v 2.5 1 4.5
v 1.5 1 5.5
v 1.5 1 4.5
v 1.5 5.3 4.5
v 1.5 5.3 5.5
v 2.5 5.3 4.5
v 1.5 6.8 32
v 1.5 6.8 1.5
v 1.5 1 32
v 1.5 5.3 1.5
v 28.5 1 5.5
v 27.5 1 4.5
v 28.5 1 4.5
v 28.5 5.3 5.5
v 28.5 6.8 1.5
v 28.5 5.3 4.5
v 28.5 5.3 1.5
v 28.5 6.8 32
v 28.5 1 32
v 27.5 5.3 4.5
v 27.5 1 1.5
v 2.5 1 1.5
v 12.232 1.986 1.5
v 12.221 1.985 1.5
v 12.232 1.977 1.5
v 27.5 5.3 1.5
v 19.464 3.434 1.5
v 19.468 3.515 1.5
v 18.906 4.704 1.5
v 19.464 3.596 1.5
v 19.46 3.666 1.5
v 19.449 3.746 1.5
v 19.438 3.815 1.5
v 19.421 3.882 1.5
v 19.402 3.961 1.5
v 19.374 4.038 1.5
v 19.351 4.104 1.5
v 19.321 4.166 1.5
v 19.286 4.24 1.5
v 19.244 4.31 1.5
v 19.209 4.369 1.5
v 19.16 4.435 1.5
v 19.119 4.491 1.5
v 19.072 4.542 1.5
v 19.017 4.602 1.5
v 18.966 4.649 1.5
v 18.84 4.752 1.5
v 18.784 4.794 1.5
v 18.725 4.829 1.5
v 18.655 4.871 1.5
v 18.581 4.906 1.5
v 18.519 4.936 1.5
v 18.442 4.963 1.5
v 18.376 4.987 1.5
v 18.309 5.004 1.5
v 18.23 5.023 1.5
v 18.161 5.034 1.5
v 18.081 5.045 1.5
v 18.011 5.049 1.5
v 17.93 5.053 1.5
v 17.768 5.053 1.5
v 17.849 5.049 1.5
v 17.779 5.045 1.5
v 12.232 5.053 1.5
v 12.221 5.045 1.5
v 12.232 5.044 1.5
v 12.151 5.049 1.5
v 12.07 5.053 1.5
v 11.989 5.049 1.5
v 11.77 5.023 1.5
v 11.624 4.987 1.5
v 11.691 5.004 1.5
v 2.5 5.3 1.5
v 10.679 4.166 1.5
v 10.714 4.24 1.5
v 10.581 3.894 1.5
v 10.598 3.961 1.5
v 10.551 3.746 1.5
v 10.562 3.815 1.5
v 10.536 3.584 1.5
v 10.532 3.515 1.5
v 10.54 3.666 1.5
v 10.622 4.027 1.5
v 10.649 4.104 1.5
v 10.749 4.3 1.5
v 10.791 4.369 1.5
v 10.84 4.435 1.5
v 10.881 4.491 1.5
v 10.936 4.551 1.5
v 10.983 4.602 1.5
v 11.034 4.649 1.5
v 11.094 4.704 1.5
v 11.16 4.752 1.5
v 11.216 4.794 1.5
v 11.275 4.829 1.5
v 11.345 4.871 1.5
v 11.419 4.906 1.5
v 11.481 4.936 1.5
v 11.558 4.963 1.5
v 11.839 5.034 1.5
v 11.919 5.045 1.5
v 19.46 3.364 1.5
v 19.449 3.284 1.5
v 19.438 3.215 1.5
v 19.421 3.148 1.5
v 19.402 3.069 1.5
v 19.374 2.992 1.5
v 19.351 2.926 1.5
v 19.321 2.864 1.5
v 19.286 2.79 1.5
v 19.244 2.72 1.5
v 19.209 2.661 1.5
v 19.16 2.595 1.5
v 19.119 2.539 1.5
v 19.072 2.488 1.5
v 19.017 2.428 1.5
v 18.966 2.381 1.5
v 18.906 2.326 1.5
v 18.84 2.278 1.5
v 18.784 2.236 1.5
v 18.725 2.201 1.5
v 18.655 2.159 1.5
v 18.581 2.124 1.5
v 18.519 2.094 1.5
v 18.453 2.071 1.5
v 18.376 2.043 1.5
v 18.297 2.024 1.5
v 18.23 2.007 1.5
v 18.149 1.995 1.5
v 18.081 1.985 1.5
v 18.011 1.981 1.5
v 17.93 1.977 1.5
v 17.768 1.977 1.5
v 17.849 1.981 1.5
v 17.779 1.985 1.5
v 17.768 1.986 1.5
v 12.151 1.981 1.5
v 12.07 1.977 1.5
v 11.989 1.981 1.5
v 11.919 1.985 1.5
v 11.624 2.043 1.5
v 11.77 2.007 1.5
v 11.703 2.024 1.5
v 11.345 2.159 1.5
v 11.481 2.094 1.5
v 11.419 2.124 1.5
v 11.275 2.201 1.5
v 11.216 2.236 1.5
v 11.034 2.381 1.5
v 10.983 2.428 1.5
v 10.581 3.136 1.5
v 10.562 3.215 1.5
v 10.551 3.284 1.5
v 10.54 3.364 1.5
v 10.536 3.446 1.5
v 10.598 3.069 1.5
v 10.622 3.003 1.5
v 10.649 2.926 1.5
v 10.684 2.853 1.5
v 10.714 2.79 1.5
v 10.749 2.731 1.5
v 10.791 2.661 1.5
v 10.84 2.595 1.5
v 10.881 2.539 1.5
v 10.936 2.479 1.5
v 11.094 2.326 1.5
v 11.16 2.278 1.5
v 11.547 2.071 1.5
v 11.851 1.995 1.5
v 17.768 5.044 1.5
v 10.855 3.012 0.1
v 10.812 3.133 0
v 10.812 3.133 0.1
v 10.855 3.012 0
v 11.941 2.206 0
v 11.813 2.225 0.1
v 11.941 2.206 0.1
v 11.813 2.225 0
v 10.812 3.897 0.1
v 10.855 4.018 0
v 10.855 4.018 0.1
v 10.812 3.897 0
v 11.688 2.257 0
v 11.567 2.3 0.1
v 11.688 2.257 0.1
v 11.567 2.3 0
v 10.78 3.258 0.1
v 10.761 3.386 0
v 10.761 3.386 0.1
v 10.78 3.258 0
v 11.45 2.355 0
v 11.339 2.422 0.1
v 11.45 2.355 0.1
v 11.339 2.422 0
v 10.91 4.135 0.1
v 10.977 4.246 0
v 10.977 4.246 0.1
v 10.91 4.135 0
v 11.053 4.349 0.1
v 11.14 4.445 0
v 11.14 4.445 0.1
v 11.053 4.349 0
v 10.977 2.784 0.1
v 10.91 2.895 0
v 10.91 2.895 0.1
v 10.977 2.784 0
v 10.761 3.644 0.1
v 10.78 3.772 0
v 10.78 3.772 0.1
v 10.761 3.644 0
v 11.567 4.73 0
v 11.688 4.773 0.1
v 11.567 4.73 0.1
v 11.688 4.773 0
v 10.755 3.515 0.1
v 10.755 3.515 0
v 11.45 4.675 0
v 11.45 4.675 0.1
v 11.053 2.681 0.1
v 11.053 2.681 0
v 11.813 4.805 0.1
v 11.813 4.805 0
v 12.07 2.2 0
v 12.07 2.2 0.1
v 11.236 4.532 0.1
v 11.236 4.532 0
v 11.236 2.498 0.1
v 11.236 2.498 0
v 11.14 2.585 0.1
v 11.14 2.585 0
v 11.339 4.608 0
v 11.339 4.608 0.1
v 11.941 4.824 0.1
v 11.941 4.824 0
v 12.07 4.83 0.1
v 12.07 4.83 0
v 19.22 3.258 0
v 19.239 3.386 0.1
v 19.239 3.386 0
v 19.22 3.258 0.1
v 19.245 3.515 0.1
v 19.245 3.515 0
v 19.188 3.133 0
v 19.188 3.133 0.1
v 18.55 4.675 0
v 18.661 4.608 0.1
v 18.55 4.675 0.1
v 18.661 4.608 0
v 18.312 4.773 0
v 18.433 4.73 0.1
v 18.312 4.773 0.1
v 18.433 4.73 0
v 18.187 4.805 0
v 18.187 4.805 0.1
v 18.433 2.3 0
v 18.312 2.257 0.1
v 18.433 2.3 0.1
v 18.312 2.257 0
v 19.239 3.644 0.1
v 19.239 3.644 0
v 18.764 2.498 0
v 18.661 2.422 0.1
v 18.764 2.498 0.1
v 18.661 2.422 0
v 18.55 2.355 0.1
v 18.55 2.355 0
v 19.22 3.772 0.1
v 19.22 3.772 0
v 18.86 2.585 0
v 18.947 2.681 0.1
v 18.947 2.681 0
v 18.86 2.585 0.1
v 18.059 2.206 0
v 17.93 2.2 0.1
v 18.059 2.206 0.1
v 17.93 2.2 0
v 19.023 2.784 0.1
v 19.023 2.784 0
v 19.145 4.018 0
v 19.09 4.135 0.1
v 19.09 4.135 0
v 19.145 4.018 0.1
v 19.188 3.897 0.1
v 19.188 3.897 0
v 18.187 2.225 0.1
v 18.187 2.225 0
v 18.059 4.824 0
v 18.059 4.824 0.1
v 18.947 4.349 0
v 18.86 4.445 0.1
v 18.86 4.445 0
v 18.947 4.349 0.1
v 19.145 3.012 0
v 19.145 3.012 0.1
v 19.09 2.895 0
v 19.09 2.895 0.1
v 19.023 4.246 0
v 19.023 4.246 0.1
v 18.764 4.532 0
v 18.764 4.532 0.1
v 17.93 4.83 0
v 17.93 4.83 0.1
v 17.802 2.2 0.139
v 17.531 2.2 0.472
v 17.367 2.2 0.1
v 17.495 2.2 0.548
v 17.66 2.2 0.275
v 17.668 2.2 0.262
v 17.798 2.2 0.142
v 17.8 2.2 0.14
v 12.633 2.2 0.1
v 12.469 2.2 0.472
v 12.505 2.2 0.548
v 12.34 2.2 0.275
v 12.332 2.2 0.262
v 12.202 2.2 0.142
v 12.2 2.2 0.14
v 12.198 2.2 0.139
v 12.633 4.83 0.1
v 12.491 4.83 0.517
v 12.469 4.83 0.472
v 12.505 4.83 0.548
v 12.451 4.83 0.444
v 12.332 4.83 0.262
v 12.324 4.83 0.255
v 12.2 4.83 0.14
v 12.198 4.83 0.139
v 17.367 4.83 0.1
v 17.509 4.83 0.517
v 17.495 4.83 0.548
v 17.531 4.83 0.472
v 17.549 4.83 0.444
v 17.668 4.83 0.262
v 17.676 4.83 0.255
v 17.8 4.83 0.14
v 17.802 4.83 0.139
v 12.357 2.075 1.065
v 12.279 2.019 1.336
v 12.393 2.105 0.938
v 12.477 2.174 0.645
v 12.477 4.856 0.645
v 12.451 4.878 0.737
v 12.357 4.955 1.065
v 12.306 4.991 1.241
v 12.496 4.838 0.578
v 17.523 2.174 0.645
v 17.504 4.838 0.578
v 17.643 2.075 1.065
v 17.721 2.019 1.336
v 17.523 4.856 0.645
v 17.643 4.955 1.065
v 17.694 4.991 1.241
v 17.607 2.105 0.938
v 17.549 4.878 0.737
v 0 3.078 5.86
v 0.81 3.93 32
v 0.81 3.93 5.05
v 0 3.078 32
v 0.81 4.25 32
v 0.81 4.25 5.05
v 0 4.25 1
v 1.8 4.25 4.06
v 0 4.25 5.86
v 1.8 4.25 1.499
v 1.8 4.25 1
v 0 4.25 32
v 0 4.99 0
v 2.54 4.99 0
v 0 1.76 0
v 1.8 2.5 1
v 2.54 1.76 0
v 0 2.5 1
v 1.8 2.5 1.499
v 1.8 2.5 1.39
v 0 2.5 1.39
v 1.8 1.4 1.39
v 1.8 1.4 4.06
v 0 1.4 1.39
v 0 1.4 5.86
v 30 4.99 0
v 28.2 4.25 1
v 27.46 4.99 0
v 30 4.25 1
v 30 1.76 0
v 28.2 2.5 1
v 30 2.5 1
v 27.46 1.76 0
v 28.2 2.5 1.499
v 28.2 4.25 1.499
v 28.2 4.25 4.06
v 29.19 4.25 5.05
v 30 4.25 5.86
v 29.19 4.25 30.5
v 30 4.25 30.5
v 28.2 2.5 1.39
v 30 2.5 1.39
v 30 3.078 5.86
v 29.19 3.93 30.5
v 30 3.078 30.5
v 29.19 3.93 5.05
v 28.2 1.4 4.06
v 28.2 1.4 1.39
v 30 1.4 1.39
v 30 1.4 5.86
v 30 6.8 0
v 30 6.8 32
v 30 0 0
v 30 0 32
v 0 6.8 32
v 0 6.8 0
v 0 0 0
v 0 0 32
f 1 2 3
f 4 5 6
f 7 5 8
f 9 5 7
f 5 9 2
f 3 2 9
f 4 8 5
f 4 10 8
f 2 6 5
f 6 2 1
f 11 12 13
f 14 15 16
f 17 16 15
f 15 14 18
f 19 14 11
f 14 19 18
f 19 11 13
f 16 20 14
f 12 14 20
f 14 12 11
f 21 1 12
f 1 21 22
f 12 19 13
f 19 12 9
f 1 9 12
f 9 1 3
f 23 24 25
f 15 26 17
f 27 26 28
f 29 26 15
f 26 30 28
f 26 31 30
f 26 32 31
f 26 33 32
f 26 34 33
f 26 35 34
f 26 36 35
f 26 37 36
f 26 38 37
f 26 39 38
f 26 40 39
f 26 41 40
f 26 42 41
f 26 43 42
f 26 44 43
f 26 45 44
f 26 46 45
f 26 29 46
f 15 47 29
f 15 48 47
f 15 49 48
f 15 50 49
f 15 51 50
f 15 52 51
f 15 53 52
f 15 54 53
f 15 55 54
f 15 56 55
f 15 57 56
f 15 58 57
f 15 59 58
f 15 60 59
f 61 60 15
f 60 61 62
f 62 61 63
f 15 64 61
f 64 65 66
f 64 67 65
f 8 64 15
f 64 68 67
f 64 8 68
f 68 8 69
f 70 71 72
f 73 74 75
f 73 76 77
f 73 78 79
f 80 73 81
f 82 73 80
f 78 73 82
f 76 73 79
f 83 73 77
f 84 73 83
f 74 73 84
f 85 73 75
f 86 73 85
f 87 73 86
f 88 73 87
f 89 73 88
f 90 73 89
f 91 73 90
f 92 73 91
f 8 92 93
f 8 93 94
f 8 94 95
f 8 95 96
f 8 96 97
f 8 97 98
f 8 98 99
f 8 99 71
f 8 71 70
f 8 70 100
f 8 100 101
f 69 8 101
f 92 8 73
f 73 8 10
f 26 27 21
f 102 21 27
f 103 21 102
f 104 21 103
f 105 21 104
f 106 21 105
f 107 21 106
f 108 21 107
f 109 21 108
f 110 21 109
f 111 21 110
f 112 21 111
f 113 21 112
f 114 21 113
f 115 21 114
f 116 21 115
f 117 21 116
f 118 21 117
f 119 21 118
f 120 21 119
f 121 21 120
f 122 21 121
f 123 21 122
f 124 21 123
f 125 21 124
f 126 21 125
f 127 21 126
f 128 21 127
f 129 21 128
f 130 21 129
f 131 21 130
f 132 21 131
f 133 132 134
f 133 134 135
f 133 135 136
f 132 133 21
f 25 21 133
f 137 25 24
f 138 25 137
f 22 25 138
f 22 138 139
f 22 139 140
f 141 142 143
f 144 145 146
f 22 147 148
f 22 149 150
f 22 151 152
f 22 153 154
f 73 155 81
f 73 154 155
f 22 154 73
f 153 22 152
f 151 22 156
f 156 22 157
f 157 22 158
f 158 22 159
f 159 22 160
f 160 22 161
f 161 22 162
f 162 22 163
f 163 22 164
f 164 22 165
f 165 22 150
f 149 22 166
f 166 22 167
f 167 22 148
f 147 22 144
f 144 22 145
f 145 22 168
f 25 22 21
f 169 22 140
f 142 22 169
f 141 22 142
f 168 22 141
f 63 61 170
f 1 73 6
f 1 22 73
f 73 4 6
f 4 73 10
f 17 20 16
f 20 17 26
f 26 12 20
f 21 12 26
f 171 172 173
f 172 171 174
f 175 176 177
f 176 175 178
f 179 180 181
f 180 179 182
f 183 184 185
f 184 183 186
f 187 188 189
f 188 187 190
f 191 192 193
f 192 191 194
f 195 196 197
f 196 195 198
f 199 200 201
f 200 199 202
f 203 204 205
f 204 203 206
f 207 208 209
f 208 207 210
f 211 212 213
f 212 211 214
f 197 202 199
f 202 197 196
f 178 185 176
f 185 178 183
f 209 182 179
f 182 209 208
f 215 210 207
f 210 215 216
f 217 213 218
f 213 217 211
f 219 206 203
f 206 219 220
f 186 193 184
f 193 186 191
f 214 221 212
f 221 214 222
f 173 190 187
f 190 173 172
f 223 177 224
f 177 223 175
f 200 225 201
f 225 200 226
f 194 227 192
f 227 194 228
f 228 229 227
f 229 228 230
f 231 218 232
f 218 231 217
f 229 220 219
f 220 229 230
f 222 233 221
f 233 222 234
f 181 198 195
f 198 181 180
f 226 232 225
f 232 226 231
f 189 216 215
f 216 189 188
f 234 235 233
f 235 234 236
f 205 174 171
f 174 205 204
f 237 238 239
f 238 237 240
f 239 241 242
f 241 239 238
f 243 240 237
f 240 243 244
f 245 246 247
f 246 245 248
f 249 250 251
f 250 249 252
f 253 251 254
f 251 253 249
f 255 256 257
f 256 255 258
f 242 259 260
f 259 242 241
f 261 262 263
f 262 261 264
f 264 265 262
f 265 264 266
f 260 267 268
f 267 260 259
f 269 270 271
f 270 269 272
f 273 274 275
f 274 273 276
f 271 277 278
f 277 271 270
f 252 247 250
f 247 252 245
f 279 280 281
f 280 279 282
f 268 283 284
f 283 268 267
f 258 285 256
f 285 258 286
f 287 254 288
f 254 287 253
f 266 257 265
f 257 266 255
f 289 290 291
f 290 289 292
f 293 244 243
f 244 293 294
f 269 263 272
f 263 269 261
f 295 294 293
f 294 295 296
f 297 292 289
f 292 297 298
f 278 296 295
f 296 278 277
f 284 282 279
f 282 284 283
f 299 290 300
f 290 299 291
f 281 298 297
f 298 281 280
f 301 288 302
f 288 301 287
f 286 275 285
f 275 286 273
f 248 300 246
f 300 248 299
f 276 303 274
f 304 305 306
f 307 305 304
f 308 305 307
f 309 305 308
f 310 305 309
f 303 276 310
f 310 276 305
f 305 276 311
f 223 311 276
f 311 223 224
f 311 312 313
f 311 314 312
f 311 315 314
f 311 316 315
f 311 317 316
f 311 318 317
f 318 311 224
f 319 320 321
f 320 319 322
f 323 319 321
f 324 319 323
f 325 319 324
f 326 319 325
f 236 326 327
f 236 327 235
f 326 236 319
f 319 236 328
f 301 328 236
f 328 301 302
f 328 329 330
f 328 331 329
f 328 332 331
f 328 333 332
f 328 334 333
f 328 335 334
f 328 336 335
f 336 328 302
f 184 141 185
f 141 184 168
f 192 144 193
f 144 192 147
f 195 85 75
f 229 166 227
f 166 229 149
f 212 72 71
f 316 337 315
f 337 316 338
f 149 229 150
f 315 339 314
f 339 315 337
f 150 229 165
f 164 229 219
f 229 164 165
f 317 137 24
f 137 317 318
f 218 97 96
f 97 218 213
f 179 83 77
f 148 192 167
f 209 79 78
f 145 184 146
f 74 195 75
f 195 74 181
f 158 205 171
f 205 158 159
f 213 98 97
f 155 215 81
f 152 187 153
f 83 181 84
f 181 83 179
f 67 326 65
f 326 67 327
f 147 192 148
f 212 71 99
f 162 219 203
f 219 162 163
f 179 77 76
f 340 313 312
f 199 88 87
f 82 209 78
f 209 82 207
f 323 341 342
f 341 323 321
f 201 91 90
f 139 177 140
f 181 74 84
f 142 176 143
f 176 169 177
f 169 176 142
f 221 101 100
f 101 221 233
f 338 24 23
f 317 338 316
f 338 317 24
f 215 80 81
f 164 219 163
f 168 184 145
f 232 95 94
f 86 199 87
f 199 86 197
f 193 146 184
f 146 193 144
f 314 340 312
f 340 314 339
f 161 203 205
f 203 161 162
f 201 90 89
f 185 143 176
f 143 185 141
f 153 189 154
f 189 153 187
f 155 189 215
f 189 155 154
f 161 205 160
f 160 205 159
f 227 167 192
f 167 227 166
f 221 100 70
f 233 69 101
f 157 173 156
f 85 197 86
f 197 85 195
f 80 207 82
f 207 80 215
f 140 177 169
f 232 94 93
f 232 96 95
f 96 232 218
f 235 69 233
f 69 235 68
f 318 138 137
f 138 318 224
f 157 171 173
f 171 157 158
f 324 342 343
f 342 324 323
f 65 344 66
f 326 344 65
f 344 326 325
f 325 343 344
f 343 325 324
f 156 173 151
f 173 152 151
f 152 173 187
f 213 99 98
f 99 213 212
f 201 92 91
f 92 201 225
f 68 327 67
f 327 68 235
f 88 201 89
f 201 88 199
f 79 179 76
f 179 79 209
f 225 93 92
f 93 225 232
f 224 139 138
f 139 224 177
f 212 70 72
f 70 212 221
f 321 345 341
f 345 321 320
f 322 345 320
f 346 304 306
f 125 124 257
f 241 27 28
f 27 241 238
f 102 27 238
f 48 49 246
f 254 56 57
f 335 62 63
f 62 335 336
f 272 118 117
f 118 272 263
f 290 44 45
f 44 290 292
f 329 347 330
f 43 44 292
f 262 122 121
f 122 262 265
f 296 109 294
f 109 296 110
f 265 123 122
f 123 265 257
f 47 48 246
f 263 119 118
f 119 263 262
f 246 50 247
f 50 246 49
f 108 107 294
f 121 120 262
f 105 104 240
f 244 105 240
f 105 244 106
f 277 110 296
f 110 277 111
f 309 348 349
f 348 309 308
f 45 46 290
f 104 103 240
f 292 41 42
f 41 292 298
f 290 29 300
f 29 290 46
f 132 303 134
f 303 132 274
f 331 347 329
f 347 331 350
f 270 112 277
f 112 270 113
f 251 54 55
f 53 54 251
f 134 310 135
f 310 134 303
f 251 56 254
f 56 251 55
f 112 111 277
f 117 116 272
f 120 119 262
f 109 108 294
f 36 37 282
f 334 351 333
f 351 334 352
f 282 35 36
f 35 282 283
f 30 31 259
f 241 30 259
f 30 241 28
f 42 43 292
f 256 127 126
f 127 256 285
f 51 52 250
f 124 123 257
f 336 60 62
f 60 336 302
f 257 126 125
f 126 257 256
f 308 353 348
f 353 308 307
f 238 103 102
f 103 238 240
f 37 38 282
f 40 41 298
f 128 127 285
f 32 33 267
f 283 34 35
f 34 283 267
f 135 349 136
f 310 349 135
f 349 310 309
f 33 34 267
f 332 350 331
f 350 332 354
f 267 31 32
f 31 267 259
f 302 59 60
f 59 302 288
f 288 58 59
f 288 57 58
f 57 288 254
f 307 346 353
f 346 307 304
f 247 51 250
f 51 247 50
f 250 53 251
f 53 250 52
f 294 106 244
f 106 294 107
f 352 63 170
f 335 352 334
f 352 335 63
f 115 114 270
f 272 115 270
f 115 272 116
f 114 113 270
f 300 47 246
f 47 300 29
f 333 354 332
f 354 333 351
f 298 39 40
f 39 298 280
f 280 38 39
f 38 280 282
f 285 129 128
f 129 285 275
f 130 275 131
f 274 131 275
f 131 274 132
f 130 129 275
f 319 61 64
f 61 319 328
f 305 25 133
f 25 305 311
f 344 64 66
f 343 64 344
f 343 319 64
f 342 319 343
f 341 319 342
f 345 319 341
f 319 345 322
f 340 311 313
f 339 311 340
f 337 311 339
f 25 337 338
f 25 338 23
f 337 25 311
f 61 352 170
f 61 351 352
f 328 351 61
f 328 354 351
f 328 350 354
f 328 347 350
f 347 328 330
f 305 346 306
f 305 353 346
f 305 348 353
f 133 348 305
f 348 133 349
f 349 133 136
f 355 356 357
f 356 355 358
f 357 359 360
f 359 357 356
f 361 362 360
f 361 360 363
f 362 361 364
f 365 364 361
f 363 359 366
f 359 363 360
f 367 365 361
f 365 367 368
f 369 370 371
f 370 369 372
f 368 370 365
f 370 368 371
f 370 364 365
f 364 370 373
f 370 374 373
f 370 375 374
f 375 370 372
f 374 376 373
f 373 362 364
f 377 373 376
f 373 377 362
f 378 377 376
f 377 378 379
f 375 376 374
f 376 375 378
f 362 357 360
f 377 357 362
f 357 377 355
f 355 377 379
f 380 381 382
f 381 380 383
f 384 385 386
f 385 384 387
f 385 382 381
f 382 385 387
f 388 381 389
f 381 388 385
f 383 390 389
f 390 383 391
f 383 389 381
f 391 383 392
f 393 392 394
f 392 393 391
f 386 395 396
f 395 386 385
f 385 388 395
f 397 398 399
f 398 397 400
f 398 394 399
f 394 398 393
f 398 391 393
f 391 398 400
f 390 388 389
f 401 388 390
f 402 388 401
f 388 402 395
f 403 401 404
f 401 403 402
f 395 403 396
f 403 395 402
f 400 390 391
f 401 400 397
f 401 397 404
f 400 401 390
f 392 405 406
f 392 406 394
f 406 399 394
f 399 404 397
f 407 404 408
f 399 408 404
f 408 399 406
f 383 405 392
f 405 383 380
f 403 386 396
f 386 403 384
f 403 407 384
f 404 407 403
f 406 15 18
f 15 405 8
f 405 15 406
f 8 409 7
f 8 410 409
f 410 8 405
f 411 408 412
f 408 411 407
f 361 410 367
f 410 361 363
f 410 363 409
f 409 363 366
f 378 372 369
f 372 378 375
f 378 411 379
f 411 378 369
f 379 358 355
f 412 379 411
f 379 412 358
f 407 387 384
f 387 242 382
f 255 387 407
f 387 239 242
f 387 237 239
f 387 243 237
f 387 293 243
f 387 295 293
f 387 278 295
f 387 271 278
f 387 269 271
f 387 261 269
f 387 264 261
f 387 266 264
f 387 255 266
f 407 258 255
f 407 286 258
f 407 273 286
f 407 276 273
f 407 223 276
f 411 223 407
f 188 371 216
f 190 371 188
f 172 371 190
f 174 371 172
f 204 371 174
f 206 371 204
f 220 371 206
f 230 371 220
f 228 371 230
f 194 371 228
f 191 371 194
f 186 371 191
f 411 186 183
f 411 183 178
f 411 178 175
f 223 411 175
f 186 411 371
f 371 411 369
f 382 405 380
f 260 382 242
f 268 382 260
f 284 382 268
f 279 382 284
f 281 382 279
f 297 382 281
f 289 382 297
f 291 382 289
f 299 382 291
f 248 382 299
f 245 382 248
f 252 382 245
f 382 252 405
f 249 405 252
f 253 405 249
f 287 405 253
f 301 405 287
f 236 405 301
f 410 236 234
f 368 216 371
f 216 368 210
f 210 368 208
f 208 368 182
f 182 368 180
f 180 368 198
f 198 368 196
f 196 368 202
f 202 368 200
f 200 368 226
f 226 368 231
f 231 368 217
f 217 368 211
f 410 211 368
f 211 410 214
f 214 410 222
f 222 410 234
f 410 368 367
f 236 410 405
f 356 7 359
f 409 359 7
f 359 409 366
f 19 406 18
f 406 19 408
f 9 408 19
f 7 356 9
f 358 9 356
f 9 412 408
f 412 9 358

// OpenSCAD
// file: components/usb_c_cutout.scad
// The cutout for the USB-C plug
module usb_c_cutout(usb_c_r, usb_c_w, usb_c_h, front_thickness, open_top) {
    length = 10 + front_thickness;

    // The plug is "pushed in" by an extra 0.6 to account for 3d printing tolerances
    translate([-usb_c_w / 2 + usb_c_r, 7 - length + 0.6, usb_c_r])
        rotate([-90, 0, 0])
            union() {
                translate([0, usb_c_r, 0])
                    cylinder(r=usb_c_r, h=length, $fn=64);

                translate([usb_c_w - usb_c_r * 2, usb_c_r, 0])
                    cylinder(r=usb_c_r, h=length, $fn=64);

                cube([usb_c_w - usb_c_r * 2, usb_c_r * 2, length]);

                // Cutout for the pin side of the shell that expands out
                lesser = 7.7;

                translate([0, usb_c_r, 0])
                    cylinder(r2=usb_c_r, r1=3.84 / 2, h=length - lesser, $fn=64);

                translate([usb_c_w - usb_c_r * 2, usb_c_r, 0])
                    cylinder(r2=usb_c_r, r1=3.84 / 2, h=length - lesser, $fn=64);

                translate([usb_c_w / 2 - usb_c_r, usb_c_r, 0])
                    scale([1.8, 1, 1])
                        rotate([0, 0, 45])
                            cylinder(r2=usb_c_r * sqrt(2), r1=3.84 / 2 * sqrt(2), h=length - lesser, $fn=4);

                // If the card drops in from the top rather than sliding in from the front,
                // cut out a slot for the USB-C plug to drop into.
                if (open_top) {
                    translate([-usb_c_r, -10 + usb_c_r, 0])
                        cube([usb_c_w, 10, length]);
                }
            }
}
// file: components/rail.scad
include <anti_z_fighting.scad>

// The rail cutout in the sides of the card
module rail(card, distance_from_end = 0, make_printable = true) {
    rail_depth = 0.81;
    rail_flat_h = 0.32;

    mirror([0, 1, 0]) {

        // The rail that holds the card
        bottom_angle = 43.54;
        difference() {
            start = -anti_z_fighting_value;

            distance_from_end = (distance_from_end > 0) ? distance_from_end : -anti_z_fighting_value;
            end = card[1] - distance_from_end - start;

            // Removing
            union() {
                translate([rail_depth, start, -rail_flat_h])
                    rotate([0, 180 + bottom_angle, 0])
                        cube([2, end, 2]);

                translate([-2 + rail_depth, start, -rail_flat_h])
                    cube([2, end, rail_flat_h]);
            }

            // Re-adding
            translate([-5 + rail_depth, start, 0])
                cube([5, end, 5]);
        }

        pyramid_inset = 1.3 + 0.5;

        // The ramps to make slotting into the latch smooth
        translate([-1.75 / 2 + pyramid_inset, 0, -1.75 / 2]) {
            width_bottom = 3.23;
            width_top = 1.75;
            height = 1.0;

            __ramp_pyramoid(width_bottom, width_top, height);

            width_extra = 0.05 + anti_z_fighting_value;
            height_straight = 1.5; // Large enough to overlap
            translate([-width_extra / 2, height_straight / 2 - anti_z_fighting_value, 0])
                cube([width_top + width_extra, height_straight, width_top], center=true);
        }

        latch_l = 2.67;
        latch_d = pyramid_inset;
        latch_h = 2.85;
        latch_wall = 1.39;

        // The pocket that the latch bar drops into, including a 45 degree cut for printability
        translate([-anti_z_fighting_value, latch_wall, -latch_h])
            cube([latch_d + anti_z_fighting_value, latch_l, latch_h]);

        if (make_printable) {
            translate([latch_d, latch_wall + latch_l, -latch_h])
                rotate([0, 0, -180 + 45])
                    translate([0, -latch_l, 0])
                        cube([latch_d * 2, latch_l, latch_h]);
        }
    }
}

module __ramp_pyramoid(width_bottom, width_top, height) {
    points = [
        // Anti Z-fighting
        [width_bottom / 2, -anti_z_fighting_value, width_bottom / 2],
        [-width_bottom / 2, -anti_z_fighting_value, width_bottom / 2],
        [-width_bottom / 2, -anti_z_fighting_value, -width_bottom / 2],
        [width_bottom / 2, -anti_z_fighting_value, -width_bottom / 2],
        // Front
        [width_bottom / 2, 0, width_bottom / 2],
        [-width_bottom / 2, 0, width_bottom / 2],
        [-width_bottom / 2, 0, -width_bottom / 2],
        [width_bottom / 2, 0, -width_bottom / 2],
        // Rail
        [width_top / 2, height, width_top / 2],
        [-width_bottom / 2, height, width_top / 2], // Stretched
        [-width_bottom / 2, height, -width_top / 2], // Stretched
        [width_top / 2, height, -width_top / 2],
    ];

    faces = [
        [0, 1, 2, 3], // Front
        [11, 10, 9, 8], // Back
        // Perpendicular
        [0, 4, 5, 1], // Top
        [1, 5, 6, 2], // Left
        [2, 6, 7, 3], // Bottom
        [0, 3, 7, 4], // Right
        // Sloped
        [4, 8, 9, 5], // Top
        [5, 9, 10, 6], // Left
        [6, 10, 11, 7], // Bottom
        [4, 7, 11, 8], // Right
    ];

    polyhedron(points=points, faces=faces);
}
// file: components/anti_z_fighting.scad
// https://en.wikipedia.org/wiki/Z-fighting
// Add or subtract this value to prevent Z-fighting on coplanar polygons.
anti_z_fighting_value = 0.001;
// file: components/expansion_card_base.scad
include <anti_z_fighting.scad>

use <rail.scad>
use <usb_c_cutout.scad>

// A basic, printable Expansion Card enclosure
//  open_end - A boolean to make the end of the card that is exposed when inserted open
//  make_printable - Adds ribs to improve printability
module expansion_card_base(base, front_thickness, bottom_thickness, side_thickness, usb_c_r, usb_c_w, usb_c_h, rail_h, open_end, make_printable) {
    // Hollowing of the inside
    inner = [base[0] - side_thickness * 2, base[1] - front_thickness * 2, base[2] - bottom_thickness + anti_z_fighting_value];

    difference() {
        cube(base);

        difference() {
            // The main hollow
            translate([side_thickness, open_end ? -anti_z_fighting_value : front_thickness, bottom_thickness])
                cube([inner[0], open_end ? inner[1] + front_thickness + anti_z_fighting_value : inner[1], inner[2] + anti_z_fighting_value]);

            // Extra wall thickness where the latch cutouts are
            notch = 1.0;
            notch_offset = 1.5;
            notch_l = 4.5 - front_thickness;
            notch_h = 5.3 - bottom_thickness;

            assert(side_thickness >= notch_offset, "There is a gap if the side thickness is smaller than the notch offset!")

            translate([notch_offset, inner[1] + front_thickness - notch_l, bottom_thickness + notch_h / 2])
                rotate([0, 0, -90])
                    rotate([0, 90, 0])
                        __rib(notch_h, notch);

            translate([notch_offset, inner[1] + front_thickness - notch_l, bottom_thickness])
                cube([notch, notch_l, notch_h]);

            translate([base[0] - notch_offset, inner[1] + front_thickness - notch_l, bottom_thickness + notch_h / 2])
                rotate([0, 0, 180])
                    rotate([0, 90, 0])
                        __rib(notch_h, notch);

            translate([base[0] - notch_offset - notch, inner[1] + front_thickness - notch_l, bottom_thickness])
                cube([notch, notch_l, notch_h]);
        }

        // The USB-C plug cutout
        translate([base[0] / 2, base[1], usb_c_r + usb_c_h])
            usb_c_cutout(usb_c_r, usb_c_w, usb_c_h, front_thickness, !open_end);

        // The sliding rails
        translate([0, base[1], rail_h])
            rail(base, 0, make_printable);

        translate([base[0], base[1], rail_h])
            mirror([1, 0, 0])
                rail(base, side_thickness, make_printable);
    }
}

// A simple 45 degree rib to improve printability
module __rib(thickness, height) {
    translate([-thickness / 2, 0, 0])
        difference() {
            cube([thickness, height, height]);

            translate([-thickness / 2, height, 0])
                rotate([45, 0, 0])
                    cube([thickness * 2, height * 2, height * 2]);
        }
}
// main file
// Parametric Expansion Card
//  An OpenSCAD implementation of a basic enclosure of an Expansion Card for
//  use with Framework products like the Framework Laptop.
//
//  See https://frame.work for more information about Framework products and
//  additional documentation around Expansion Cards.

// Parametric Expansion Card © 2021 by Nirav Patel at Framework Computer LLC
// is licensed under Attribution 4.0 International. 
// To view a copy of this license, visit http://creativecommons.org/licenses/by/4.0/

use <components/expansion_card_base.scad>

// The basic dimensions of an Expansion Card
base = [30.0, 32.0, 6.8];

// Wall thicknesses
front_thickness = 1.5;
bottom_thickness = 1.0;
side_thickness = 1.5;

// USB-C plug dimensions
usb_c_r = 1.315;
usb_c_w = 5.86 + usb_c_r * 2;
usb_c_h = 2.2;

// To top of rail
rail_h = 4.25;

// Incomplete implementation of a lid to use with this shell
module expansion_card_lid() {
    gap = 0.25;
    union() {
        translate([side_thickness + gap, side_thickness + gap, base[2] - side_thickness]) cube([base[0] - side_thickness * 2 - gap * 2, base[1] - side_thickness * 2 - gap * 2, side_thickness]);
        difference() {
            translate([base[0] / 2 - usb_c_w / 2 + gap, base[1] - side_thickness - gap, usb_c_r + usb_c_h]) cube([usb_c_w - gap * 2, side_thickness + gap, base[2] - (usb_c_r + usb_c_h)]);
            translate([base[0] / 2, base[1], usb_c_r + usb_c_h]) usb_c_cutout(usb_c_r, usb_c_w, usb_c_h, side_thickness, false);
        }
    }
}

// Rotate into a printable orientation
rotate([-90, 0, 0]) translate([0, -base[1], 0]) expansion_card_base(base, front_thickness, bottom_thickness, side_thickness, usb_c_r, usb_c_w, usb_c_h, rail_h, open_end=true, make_printable=true);
